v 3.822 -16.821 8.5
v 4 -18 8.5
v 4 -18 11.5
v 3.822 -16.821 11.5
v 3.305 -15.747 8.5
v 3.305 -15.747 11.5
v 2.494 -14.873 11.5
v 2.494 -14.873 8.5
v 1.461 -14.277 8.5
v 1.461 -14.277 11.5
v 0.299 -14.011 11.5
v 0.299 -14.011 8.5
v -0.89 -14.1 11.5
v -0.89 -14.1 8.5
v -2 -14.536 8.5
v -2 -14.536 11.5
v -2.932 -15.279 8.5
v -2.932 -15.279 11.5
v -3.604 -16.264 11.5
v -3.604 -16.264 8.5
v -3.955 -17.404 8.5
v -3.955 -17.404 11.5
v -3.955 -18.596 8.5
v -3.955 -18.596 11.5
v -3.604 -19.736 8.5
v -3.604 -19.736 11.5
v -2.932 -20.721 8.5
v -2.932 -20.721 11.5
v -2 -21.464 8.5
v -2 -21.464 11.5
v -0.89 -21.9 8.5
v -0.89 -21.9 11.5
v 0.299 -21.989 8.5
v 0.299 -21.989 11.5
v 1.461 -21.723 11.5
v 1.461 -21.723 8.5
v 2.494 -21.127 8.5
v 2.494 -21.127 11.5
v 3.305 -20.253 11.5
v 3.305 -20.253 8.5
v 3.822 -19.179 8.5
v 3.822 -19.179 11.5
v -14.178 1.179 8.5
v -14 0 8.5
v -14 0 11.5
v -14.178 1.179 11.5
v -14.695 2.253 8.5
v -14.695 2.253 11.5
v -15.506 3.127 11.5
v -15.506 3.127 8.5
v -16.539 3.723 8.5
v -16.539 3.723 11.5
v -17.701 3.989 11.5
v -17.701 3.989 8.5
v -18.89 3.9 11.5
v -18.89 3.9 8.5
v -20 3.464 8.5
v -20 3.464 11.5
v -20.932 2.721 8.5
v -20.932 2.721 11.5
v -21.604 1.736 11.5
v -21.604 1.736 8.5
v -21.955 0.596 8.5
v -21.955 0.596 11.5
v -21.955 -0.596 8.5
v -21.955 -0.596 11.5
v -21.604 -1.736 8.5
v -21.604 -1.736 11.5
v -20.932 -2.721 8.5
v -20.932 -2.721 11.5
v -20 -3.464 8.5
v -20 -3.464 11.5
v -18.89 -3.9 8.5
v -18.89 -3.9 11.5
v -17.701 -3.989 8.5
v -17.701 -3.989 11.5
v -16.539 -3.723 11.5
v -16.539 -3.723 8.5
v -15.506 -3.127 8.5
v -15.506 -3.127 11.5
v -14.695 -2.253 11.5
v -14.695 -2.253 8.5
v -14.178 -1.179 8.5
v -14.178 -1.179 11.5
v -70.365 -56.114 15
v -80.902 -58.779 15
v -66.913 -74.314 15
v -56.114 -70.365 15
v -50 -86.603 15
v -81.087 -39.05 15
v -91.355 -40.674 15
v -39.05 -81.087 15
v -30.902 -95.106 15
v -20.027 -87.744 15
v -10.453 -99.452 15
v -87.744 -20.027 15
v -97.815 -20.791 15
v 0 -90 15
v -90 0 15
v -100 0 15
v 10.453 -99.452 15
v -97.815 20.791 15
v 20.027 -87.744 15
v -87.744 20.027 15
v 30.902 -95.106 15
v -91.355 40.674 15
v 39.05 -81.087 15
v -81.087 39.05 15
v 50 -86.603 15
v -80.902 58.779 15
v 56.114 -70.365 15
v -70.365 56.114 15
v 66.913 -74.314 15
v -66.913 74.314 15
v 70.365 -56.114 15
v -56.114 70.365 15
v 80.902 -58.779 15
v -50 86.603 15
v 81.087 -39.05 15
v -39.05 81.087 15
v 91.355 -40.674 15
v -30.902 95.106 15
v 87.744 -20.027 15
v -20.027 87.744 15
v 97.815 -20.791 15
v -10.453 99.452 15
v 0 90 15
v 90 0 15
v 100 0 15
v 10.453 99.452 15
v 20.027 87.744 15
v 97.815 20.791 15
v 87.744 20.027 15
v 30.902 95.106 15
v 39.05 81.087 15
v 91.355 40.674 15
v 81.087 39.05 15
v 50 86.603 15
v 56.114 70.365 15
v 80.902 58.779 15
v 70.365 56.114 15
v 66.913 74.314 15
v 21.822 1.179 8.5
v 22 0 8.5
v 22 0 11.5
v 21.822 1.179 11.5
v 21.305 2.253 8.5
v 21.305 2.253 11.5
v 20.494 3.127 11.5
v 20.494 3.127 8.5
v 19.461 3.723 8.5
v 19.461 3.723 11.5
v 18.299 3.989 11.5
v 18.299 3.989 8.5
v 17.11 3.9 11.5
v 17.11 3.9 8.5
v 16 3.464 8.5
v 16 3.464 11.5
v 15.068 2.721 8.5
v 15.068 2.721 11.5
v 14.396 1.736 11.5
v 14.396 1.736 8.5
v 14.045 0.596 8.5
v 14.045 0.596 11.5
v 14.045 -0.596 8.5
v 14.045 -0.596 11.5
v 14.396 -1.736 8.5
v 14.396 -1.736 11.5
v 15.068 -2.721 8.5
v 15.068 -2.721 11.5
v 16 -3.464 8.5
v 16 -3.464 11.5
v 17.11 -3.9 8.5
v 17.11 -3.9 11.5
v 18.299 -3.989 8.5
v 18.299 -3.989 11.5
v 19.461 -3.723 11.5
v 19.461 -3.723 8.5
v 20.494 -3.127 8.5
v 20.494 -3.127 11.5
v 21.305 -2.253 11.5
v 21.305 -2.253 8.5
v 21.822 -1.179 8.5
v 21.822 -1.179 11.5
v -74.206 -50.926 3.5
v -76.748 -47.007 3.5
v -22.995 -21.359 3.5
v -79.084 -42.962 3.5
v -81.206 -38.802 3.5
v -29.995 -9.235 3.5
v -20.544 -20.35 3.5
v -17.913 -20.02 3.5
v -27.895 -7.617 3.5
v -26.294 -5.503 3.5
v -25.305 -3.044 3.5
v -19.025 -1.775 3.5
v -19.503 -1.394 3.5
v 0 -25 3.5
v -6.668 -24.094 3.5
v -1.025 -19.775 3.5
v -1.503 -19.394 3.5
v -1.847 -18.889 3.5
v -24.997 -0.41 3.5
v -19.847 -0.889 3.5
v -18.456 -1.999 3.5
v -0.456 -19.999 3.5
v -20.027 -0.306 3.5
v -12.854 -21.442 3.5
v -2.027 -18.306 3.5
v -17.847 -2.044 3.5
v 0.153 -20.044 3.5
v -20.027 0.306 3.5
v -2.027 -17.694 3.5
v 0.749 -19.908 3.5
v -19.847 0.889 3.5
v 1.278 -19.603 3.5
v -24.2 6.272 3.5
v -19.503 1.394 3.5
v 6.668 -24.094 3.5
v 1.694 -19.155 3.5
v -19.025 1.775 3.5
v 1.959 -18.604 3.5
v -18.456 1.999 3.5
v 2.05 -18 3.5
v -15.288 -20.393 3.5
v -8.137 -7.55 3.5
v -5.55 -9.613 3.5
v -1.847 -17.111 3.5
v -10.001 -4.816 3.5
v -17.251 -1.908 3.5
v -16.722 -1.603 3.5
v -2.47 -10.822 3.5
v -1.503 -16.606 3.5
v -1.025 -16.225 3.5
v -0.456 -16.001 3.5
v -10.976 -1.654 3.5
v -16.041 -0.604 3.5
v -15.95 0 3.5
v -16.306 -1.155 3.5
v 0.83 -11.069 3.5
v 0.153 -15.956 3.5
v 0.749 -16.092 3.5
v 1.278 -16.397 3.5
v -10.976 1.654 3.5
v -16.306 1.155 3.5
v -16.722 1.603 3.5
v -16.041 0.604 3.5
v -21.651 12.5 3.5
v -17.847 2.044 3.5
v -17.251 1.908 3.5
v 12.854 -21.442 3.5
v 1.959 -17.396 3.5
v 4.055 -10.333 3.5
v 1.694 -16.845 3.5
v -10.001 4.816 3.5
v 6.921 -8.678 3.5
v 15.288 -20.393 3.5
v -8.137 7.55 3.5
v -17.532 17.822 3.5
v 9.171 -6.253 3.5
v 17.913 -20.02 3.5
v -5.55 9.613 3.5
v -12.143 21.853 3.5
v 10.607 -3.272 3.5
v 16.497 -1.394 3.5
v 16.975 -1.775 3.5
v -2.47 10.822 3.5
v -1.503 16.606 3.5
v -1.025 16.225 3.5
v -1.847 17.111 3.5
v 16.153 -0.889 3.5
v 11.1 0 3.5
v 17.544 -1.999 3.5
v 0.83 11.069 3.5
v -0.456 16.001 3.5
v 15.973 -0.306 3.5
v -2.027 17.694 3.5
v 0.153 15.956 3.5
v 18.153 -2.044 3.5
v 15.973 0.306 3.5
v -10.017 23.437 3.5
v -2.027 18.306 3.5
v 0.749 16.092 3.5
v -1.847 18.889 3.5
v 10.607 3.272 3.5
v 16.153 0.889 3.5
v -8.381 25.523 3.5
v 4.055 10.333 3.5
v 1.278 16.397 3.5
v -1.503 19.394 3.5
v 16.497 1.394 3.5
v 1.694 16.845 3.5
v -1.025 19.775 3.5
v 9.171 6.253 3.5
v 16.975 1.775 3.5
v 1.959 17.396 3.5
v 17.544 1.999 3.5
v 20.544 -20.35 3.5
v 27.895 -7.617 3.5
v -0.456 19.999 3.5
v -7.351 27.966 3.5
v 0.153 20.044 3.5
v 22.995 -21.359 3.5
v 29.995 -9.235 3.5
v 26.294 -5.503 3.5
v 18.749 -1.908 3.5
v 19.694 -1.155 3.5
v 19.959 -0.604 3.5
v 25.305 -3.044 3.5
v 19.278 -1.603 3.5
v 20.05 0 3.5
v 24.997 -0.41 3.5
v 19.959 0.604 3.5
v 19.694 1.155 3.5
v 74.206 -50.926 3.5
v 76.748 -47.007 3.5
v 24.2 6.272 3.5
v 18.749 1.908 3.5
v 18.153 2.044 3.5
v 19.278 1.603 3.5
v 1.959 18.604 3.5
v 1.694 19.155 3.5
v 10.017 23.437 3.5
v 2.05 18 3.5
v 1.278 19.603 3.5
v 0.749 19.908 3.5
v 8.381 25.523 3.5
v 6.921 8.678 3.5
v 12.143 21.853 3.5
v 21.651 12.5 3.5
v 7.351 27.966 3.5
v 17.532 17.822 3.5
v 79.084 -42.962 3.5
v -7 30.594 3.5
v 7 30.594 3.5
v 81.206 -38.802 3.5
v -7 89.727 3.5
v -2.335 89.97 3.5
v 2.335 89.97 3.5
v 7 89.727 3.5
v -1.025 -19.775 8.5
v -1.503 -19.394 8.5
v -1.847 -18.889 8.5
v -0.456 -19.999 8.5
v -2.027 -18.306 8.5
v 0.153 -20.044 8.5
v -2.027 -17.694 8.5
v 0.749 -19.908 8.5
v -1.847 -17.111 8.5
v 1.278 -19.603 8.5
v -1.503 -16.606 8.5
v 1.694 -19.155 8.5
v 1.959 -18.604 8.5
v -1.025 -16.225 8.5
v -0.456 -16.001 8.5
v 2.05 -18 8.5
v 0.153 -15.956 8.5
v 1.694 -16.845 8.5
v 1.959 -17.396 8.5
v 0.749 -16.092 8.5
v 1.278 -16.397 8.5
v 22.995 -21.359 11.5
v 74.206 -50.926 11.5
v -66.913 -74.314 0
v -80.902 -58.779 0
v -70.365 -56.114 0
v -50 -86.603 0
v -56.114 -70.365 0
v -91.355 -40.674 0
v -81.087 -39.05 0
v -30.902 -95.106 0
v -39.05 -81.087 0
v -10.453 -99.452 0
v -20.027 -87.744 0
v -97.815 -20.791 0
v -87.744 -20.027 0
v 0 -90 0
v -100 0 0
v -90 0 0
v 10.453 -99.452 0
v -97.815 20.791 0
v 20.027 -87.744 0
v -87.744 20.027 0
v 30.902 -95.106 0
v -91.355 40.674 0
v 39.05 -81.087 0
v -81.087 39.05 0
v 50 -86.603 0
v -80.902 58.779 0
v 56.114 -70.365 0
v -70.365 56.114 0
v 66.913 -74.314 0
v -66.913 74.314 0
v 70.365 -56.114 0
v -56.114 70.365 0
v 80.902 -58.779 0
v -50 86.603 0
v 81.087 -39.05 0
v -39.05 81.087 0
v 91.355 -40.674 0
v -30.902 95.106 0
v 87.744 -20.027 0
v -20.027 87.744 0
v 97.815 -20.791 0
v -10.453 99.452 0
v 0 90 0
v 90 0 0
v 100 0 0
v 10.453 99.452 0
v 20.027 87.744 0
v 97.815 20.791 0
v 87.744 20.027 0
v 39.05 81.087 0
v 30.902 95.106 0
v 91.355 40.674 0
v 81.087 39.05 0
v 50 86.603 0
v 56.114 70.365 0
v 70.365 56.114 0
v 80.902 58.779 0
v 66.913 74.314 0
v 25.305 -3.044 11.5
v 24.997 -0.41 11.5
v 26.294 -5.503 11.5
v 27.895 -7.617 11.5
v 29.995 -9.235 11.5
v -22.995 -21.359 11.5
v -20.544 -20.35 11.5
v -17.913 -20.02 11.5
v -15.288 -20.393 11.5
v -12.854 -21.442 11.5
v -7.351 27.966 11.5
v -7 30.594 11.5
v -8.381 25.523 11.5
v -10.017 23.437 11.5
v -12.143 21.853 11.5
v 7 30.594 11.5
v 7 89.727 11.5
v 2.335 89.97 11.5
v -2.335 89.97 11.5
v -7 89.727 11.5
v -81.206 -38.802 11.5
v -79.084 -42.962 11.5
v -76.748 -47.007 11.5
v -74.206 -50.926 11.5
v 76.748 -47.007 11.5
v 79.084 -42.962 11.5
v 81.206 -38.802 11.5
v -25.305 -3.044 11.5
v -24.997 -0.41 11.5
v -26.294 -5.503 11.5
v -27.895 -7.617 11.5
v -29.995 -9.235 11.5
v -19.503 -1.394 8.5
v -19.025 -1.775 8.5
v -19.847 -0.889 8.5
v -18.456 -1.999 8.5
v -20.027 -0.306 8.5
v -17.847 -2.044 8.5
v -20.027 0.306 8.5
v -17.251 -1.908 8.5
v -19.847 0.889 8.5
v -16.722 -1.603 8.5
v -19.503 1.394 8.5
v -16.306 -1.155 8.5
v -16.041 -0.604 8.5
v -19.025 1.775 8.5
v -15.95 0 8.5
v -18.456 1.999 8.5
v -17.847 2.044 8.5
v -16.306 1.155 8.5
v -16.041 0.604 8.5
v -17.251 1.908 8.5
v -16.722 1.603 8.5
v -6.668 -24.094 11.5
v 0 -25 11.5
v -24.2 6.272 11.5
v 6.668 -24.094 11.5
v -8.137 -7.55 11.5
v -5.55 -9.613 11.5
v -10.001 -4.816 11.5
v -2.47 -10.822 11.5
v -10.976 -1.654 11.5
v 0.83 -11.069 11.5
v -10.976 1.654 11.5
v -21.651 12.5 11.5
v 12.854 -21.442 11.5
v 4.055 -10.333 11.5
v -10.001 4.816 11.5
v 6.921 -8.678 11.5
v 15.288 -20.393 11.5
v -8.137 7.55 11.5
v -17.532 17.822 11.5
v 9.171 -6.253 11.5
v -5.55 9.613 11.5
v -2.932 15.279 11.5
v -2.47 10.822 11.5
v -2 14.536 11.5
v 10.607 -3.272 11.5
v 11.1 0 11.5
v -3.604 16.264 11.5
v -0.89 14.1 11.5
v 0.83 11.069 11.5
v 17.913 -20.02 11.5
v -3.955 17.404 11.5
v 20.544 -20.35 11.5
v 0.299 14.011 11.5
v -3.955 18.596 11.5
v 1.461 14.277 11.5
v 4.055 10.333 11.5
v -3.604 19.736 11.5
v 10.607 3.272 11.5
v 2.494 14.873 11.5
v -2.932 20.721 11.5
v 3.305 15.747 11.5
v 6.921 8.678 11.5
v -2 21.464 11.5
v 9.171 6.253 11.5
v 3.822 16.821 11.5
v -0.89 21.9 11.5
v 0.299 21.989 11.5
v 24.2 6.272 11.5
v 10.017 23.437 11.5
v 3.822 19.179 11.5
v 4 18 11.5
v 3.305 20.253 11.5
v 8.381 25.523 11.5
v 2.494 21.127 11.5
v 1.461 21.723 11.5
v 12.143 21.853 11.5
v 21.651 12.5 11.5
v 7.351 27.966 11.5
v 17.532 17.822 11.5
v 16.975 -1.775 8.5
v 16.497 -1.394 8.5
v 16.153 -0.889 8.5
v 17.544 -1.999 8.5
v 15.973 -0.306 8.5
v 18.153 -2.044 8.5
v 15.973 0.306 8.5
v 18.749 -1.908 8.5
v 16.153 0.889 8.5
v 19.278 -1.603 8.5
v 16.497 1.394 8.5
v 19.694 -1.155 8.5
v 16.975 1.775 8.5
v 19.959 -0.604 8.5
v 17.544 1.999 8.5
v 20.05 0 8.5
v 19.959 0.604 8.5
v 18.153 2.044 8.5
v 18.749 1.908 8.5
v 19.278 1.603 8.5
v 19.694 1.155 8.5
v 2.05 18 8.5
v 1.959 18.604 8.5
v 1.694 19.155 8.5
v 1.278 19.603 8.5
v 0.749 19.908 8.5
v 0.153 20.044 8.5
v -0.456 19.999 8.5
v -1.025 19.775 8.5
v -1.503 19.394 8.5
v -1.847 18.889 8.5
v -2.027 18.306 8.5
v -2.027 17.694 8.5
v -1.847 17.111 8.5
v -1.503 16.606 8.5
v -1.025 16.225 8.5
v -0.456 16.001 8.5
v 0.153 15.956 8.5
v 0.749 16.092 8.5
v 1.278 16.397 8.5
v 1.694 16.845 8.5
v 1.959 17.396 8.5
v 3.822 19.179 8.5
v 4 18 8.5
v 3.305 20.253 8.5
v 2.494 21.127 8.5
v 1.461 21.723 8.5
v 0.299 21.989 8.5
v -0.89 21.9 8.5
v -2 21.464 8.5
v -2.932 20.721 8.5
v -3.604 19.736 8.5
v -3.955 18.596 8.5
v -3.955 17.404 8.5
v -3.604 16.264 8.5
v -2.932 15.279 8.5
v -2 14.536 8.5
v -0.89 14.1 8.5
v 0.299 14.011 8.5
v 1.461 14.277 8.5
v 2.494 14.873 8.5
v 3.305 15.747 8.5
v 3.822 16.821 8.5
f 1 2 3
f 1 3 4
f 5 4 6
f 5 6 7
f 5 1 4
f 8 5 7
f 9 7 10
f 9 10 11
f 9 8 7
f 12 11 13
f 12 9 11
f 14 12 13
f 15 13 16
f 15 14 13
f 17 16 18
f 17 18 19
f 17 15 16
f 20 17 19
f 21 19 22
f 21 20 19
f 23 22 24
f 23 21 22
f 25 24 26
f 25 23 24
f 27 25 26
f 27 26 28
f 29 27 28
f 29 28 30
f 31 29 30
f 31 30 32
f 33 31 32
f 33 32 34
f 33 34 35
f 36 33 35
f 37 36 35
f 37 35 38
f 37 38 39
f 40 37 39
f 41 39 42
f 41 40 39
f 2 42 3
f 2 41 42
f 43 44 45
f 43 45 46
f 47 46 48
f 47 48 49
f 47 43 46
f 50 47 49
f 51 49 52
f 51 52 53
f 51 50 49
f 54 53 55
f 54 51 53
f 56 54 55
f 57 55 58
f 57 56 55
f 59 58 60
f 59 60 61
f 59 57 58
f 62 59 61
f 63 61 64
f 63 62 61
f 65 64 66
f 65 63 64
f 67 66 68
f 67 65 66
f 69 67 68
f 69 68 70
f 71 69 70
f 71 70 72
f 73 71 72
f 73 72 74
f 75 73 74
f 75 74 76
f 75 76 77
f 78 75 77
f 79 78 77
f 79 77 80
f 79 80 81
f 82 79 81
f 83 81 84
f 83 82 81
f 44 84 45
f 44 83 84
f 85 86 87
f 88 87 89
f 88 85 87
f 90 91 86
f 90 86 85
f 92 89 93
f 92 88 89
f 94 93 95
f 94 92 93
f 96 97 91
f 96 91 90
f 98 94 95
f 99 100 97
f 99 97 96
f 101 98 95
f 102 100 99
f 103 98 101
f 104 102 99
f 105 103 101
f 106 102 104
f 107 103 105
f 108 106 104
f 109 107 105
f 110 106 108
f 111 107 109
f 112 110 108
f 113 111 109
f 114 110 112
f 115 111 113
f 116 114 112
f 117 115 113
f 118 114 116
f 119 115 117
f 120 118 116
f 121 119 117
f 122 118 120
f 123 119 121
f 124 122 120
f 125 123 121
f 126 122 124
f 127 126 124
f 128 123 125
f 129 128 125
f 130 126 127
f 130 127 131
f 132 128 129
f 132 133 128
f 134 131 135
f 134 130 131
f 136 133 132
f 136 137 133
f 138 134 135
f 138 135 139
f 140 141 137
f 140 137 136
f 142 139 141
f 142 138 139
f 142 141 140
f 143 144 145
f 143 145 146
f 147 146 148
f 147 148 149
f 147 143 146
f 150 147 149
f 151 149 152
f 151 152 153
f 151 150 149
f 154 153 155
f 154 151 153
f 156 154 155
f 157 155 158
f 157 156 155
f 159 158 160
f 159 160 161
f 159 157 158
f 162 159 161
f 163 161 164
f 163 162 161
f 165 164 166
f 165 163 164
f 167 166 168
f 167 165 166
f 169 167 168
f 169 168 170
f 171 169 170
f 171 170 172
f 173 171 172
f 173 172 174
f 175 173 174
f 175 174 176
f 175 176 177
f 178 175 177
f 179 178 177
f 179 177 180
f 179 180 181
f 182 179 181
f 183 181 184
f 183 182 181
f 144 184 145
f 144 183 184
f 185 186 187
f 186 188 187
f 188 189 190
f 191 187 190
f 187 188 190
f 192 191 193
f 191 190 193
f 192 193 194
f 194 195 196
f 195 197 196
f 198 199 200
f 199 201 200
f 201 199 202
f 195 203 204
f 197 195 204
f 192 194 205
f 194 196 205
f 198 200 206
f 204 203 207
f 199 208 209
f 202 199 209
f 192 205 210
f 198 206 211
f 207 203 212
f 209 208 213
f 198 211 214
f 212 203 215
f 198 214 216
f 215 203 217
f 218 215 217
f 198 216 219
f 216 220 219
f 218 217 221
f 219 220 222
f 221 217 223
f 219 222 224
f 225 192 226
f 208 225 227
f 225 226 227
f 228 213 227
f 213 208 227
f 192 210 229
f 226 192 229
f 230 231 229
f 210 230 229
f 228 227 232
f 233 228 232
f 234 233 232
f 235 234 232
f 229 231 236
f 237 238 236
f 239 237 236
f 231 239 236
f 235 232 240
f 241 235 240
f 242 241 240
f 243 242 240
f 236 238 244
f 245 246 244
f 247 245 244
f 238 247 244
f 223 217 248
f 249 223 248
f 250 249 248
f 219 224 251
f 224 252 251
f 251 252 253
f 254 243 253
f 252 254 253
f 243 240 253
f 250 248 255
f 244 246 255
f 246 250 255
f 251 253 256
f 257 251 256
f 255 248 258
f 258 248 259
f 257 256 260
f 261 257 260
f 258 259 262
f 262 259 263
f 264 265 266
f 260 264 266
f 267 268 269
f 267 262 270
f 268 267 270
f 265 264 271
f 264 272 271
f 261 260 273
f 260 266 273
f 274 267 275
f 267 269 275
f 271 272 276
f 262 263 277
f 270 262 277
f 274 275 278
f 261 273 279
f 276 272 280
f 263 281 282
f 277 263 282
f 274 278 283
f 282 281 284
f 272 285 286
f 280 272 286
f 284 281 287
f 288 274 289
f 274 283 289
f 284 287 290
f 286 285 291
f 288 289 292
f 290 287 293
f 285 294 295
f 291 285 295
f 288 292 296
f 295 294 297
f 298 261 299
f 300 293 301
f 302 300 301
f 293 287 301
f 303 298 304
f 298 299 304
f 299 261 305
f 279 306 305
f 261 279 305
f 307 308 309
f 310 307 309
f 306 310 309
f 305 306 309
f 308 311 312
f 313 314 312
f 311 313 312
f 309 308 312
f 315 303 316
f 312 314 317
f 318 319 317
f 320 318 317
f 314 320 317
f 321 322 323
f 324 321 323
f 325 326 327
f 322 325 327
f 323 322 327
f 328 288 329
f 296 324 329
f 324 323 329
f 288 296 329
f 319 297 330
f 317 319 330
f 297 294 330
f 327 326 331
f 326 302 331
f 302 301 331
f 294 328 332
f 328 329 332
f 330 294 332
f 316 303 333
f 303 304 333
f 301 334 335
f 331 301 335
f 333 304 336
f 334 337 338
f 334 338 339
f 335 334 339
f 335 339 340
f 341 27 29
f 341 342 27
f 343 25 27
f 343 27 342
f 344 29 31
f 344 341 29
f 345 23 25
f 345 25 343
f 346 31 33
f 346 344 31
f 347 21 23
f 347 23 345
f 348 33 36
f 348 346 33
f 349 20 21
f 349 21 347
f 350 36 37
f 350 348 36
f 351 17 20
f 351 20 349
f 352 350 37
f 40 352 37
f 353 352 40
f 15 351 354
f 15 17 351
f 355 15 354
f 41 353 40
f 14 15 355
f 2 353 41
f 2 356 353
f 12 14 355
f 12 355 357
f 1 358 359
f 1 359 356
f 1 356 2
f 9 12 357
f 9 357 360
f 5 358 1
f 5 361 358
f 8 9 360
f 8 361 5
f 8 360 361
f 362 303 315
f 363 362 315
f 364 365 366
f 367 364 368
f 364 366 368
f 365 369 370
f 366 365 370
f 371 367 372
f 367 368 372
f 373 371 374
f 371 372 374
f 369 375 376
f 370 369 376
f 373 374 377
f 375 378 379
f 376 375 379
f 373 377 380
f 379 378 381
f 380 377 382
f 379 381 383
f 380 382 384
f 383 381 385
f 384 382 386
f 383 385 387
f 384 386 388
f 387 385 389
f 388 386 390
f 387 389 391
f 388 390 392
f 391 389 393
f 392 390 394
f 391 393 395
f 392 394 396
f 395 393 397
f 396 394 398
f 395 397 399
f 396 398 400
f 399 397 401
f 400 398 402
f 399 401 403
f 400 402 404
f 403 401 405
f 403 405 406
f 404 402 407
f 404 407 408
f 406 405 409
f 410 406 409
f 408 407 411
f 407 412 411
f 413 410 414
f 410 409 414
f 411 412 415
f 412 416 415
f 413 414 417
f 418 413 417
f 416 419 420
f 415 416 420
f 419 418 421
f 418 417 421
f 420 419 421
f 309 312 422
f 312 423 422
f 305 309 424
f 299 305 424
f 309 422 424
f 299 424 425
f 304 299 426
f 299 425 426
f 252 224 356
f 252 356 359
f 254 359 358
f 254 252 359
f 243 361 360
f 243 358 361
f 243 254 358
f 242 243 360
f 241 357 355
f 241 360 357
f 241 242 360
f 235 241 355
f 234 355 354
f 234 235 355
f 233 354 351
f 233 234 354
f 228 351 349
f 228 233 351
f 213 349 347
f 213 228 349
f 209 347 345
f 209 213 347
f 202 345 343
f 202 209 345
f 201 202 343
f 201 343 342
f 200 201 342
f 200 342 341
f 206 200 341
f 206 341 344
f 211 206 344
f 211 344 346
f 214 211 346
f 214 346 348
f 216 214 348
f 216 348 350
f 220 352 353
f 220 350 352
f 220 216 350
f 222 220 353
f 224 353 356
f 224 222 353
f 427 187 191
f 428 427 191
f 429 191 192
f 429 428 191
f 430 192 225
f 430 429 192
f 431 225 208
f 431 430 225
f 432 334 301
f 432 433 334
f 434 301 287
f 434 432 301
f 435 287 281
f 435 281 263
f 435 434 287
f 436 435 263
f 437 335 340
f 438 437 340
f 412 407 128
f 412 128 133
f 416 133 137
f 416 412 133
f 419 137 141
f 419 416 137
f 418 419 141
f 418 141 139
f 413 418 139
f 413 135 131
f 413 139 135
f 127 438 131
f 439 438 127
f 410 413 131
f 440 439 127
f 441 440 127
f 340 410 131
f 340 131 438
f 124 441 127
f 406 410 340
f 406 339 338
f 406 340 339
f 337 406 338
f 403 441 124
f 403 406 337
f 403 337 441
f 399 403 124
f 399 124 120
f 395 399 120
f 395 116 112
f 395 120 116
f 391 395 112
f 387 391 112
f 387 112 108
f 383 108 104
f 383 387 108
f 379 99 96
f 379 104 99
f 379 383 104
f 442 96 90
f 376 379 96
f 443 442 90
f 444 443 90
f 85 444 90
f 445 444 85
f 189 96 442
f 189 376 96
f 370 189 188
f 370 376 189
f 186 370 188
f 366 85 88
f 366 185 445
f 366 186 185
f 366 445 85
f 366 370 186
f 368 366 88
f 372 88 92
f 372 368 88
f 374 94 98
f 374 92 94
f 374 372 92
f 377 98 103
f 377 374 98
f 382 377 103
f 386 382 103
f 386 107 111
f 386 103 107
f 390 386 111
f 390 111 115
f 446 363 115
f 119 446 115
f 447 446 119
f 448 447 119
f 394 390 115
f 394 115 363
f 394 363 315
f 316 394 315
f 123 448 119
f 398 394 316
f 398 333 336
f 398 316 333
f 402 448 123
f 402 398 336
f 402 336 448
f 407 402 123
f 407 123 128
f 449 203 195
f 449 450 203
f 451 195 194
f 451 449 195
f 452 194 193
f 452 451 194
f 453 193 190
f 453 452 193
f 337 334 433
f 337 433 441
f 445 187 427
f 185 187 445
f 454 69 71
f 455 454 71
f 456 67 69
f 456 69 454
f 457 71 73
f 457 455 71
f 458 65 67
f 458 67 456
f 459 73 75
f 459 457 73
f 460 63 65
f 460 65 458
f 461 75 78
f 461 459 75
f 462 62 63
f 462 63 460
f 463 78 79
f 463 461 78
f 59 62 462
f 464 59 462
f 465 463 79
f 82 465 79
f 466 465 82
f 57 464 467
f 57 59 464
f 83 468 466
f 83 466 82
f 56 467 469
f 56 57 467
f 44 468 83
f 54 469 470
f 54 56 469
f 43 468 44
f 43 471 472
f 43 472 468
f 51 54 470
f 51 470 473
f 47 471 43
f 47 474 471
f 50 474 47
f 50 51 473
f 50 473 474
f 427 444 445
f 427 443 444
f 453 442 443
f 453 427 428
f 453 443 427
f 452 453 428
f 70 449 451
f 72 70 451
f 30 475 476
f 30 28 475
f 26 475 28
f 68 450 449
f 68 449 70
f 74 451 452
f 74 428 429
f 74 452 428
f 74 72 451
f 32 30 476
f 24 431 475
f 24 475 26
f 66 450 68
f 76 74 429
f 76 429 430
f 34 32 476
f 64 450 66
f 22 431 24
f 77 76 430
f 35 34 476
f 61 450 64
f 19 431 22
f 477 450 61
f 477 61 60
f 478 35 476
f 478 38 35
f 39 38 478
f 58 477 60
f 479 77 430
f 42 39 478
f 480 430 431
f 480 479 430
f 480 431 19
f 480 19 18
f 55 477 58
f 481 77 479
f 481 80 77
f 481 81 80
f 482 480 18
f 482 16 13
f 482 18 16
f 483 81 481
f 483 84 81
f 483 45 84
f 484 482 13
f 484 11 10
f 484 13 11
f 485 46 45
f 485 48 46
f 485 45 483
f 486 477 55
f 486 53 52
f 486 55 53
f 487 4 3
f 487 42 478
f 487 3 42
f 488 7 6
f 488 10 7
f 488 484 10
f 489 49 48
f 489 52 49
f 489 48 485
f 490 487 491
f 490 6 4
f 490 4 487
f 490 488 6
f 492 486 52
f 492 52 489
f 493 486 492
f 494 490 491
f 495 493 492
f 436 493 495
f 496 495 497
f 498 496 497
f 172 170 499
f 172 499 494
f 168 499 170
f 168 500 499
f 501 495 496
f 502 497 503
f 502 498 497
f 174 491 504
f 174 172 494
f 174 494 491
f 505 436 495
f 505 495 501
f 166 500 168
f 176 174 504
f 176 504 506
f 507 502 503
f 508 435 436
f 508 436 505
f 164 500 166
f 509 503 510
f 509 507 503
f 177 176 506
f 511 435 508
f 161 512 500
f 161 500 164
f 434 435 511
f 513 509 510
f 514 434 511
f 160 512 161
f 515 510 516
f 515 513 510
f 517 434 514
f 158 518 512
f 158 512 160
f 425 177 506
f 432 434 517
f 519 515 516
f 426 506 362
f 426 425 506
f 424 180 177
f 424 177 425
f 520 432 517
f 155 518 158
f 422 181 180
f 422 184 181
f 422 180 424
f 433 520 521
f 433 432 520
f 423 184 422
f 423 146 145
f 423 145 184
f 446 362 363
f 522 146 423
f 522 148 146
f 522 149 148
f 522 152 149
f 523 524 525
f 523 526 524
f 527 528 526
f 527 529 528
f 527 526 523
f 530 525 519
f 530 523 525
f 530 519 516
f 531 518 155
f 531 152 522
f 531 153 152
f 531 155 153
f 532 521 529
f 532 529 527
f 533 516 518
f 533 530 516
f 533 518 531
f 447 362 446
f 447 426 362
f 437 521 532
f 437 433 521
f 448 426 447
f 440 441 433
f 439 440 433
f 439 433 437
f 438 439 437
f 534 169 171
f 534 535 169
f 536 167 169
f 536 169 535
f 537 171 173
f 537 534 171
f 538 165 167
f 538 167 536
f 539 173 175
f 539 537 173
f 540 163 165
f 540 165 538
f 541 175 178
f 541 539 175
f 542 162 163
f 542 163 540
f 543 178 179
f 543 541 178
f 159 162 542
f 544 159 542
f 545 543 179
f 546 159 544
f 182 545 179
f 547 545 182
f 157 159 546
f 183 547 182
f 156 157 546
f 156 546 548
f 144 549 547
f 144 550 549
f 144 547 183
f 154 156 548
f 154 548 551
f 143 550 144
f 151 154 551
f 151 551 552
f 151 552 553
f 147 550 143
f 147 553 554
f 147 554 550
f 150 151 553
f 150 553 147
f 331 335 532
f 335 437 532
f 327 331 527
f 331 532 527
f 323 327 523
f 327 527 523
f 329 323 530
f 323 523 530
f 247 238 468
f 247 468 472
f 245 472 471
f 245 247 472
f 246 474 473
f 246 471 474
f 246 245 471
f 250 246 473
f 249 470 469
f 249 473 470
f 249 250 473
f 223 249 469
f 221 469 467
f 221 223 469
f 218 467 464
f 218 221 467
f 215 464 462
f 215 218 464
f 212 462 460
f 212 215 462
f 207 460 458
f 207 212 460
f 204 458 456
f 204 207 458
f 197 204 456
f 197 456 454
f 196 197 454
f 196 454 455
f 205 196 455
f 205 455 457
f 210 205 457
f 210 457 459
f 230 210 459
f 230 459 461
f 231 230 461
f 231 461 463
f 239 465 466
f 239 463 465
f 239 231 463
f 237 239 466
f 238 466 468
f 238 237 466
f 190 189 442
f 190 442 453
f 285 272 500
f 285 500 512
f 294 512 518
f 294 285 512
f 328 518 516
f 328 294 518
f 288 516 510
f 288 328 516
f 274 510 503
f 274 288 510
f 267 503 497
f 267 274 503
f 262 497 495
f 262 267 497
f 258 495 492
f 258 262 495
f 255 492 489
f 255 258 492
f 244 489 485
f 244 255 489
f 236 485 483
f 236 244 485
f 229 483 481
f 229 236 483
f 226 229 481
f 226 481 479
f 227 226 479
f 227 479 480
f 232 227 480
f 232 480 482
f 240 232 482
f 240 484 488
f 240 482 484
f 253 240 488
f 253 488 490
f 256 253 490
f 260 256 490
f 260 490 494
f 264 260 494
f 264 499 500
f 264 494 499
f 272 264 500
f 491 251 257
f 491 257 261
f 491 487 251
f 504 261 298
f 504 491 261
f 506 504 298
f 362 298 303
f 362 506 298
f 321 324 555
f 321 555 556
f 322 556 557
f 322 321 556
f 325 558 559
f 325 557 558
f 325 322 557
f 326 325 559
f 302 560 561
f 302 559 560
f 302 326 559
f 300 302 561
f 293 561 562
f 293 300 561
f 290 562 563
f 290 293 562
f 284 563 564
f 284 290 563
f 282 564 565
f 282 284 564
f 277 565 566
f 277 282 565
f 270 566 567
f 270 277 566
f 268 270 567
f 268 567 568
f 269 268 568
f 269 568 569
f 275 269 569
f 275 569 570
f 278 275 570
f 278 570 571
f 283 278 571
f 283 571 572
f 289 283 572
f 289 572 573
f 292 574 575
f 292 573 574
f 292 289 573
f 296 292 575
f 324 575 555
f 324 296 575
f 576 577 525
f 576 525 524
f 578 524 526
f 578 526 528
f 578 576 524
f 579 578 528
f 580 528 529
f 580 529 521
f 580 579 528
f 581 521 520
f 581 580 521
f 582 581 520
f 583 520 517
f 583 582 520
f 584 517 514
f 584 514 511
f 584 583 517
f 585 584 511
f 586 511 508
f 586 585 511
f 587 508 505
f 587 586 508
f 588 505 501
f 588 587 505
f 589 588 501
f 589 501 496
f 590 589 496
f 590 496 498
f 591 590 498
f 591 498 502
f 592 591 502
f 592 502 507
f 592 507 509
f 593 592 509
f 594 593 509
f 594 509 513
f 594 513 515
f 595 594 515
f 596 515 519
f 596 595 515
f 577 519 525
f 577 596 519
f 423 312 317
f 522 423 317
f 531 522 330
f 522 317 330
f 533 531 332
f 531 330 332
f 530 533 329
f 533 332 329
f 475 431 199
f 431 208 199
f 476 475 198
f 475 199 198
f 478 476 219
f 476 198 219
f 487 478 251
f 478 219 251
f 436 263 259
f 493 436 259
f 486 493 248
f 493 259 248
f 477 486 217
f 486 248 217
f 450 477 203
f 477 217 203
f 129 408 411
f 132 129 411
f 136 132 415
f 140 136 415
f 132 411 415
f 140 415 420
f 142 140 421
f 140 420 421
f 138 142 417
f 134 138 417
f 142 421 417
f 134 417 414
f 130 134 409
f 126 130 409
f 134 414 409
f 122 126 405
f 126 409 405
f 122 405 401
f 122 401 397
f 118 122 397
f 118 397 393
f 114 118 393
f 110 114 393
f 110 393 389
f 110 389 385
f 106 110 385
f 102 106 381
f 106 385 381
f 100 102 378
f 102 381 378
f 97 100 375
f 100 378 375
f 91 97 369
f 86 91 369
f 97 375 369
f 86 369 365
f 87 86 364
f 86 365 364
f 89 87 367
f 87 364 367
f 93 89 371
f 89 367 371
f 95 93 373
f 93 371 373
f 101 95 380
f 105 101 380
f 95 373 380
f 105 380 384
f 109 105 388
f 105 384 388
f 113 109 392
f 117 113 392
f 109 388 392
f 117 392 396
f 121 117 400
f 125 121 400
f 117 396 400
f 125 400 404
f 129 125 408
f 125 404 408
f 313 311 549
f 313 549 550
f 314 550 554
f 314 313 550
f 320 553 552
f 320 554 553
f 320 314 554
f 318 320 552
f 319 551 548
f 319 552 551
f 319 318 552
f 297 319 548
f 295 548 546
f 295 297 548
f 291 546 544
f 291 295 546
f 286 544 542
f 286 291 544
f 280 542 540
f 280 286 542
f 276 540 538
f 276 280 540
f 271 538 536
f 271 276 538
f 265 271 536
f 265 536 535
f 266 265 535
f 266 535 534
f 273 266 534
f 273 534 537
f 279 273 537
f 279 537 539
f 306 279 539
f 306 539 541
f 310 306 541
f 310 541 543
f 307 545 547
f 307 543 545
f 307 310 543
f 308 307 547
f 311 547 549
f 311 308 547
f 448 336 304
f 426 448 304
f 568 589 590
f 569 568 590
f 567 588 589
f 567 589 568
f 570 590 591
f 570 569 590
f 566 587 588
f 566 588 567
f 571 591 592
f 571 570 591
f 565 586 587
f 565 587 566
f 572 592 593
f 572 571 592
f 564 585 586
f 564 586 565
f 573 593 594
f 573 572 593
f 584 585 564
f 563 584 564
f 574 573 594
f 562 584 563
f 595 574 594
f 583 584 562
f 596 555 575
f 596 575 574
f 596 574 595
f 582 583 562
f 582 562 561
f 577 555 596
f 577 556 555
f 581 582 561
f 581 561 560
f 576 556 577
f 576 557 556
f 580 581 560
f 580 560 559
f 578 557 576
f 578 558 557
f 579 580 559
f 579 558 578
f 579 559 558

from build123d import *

# Parameters (mm, degrees)
SKETCH1_R               = 100
BOSS_EXTRUDE1_DEPTH     = 15
CUT_EXTRUDE1_DEPTH      = 143.214626533
CUT_EXTRUDE1_DEPTH_BACK = 143.214626533
SKETCH2_R               = 90
BOSS_EXTRUDE3_START     = 3.5
SKETCH5_R               = 25
BOSS_EXTRUDE3_DEPTH     = 8
BOSS_EXTRUDE4_START     = 3.5
SKETCH6_W               = 14
SKETCH6_H               = 70
BOSS_EXTRUDE4_DEPTH     = 8
SKETCH9_R               = 11.1
CUT_EXTRUDE4_DEPTH      = 143.214626533
SKETCH10_R              = 2.05
CUT_EXTRUDE5_DEPTH      = 143.214626533
FILLET3_R               = 10
CUT_EXTRUDE6_START      = 8.5
SKETCH11_R              = 4
CUT_EXTRUDE6_DEPTH      = 3


with BuildPart() as part:
    # Sketch1 → Boss-Extrude1 (new body)
    with BuildSketch(Plane.XY):
        Circle(SKETCH1_R)
    extrude(amount=BOSS_EXTRUDE1_DEPTH)

    # Sketch2 → Cut-Extrude1 (cut, two sides: drawn at the far end of the back side and taken through both)
    with BuildSketch(Plane.XY.offset(-CUT_EXTRUDE1_DEPTH_BACK)):
        Circle(SKETCH2_R)
    extrude(amount=CUT_EXTRUDE1_DEPTH + CUT_EXTRUDE1_DEPTH_BACK, mode=Mode.SUBTRACT)



with BuildPart() as body_2:
    # Sketch5 → Boss-Extrude3 (new body)
    with BuildSketch(Plane.XY.offset(BOSS_EXTRUDE3_START)):
        Circle(SKETCH5_R)
    extrude(amount=BOSS_EXTRUDE3_DEPTH)


with BuildPart() as part_1:
    add(part.part)

    add(body_2.part)  # Boss-Extrude4 merges body 2
    # Sketch6 → Boss-Extrude4 (add)
    with BuildSketch(Plane.XY.offset(BOSS_EXTRUDE4_START)):
        with Locations((0, 59)):
            Rectangle(SKETCH6_W, SKETCH6_H)
        Polygon((17.284609691, -18.062177826), (77.906387956, -53.062177826), (84.906387956, -40.937822174), (24.284609691, -5.937822174), align=None)
        Polygon((-17.284609691, -18.062177826), (-77.906387956, -53.062177826), (-84.906387956, -40.937822174), (-24.284609691, -5.937822174), align=None)
    extrude(amount=BOSS_EXTRUDE4_DEPTH)

    # Sketch9 → Cut-Extrude4 (cut, through all)
    with BuildSketch(Plane.XY):
        Circle(SKETCH9_R)
    extrude(amount=CUT_EXTRUDE4_DEPTH, mode=Mode.SUBTRACT)

    # Sketch10 → Cut-Extrude5 (cut, through all)
    with BuildSketch(Plane.XY):
        with Locations((0, 18)):
            Circle(SKETCH10_R)
        with Locations((18, 0)):
            Circle(SKETCH10_R)
        with Locations((0, -18)):
            Circle(SKETCH10_R)
        with Locations((-18, 0)):
            Circle(SKETCH10_R)
    extrude(amount=CUT_EXTRUDE5_DEPTH, mode=Mode.SUBTRACT)

    # Fillet3
    fillet3_edges = [part_1.edges().sort_by_distance(p)[0] for p in [
        (-7, 24, 7.5),
        (7, 24, 7.5),
        (24.284609691, -5.937822174, 7.5),
        (17.284609691, -18.062177826, 7.5),
        (-17.284609691, -18.062177826, 7.5),
        (-24.284609691, -5.937822174, 7.5),
    ]]
    fillet(fillet3_edges, radius=FILLET3_R)

    # Sketch11 → Cut-Extrude6 (cut)
    with BuildSketch(Plane.XY.offset(CUT_EXTRUDE6_START)):
        with Locations((18, 0)):
            Circle(SKETCH11_R)
        with Locations((0, -18)):
            Circle(SKETCH11_R)
        with Locations((-18, 0)):
            Circle(SKETCH11_R)
        with Locations((0, 18)):
            Circle(SKETCH11_R)
    extrude(amount=CUT_EXTRUDE6_DEPTH, mode=Mode.SUBTRACT)


solid = part_1.part
